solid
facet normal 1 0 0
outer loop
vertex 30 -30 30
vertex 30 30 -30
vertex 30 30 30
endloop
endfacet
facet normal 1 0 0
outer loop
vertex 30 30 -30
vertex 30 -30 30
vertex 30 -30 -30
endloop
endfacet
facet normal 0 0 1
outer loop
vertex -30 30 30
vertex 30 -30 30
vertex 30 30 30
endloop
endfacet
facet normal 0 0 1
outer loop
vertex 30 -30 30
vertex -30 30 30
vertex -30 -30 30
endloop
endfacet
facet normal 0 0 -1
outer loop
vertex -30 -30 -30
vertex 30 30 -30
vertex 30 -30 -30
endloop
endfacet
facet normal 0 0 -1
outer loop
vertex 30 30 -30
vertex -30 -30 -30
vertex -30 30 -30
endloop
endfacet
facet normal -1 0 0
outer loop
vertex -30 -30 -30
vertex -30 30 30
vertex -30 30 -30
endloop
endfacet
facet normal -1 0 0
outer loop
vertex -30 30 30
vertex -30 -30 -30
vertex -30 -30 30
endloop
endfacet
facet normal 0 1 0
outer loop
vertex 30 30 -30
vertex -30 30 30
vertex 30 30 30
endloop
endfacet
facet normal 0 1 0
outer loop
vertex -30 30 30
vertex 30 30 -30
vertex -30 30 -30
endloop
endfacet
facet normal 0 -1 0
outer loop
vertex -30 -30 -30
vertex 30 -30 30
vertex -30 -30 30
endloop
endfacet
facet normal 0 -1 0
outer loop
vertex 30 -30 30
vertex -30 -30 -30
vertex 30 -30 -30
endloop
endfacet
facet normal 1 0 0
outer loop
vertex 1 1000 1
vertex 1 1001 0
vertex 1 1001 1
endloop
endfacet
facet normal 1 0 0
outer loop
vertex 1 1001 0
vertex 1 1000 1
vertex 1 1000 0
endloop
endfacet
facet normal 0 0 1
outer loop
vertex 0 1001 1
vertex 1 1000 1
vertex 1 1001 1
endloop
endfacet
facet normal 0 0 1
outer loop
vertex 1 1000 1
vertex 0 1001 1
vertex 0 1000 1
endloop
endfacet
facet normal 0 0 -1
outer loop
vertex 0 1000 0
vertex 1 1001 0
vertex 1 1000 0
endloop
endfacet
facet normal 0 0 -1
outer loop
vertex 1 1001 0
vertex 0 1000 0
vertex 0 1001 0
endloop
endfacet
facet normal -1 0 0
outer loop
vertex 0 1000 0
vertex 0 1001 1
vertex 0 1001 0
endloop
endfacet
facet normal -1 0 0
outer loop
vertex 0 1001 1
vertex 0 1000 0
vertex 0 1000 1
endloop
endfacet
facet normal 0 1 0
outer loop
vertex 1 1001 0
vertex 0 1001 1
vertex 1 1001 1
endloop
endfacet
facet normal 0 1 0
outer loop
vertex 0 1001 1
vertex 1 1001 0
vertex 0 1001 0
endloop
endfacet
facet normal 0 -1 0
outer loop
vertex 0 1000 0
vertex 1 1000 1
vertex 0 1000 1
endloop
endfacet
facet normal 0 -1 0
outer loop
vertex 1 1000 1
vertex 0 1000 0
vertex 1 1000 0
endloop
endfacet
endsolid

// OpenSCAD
// The depth range must be centred on the viewport's centre of rotation, not on
// the model's bounding box.
//
// A cube on the rotation centre, and one small cube a thousand units away so the
// bounding box is enormous and its centre is nowhere near either object. The
// centred cube sits where the camera orbits, so its distance from the eye never
// changes and neither may its shade - from any angle, in either of the two views
// below. A cube rather than a sphere because its faces are flat: every pixel of a
// face is at an exactly determined depth, so a drift of even one grey level is a
// real change rather than resampling noise on a curved silhouette.
//
// Rendered against separate expected images rather than a shared one, because the
// far cube genuinely moves between these angles.
//
// It cannot be otherwise, and the reason is worth writing down. Whole-image
// identity under a rotation needs the scene to be invariant under it, which pins
// the bounding box centre on the rotation axis - and then the eye-to-box-centre
// distance does not change either, so the very bug this model exists to catch
// becomes invisible. Discrimination and exact identity cannot come from the same
// pair of views. depthmap-orbit-symmetry takes the identity half on a symmetric
// scene; this file takes the discriminating half. When the range was centred on
// the bounding box, the centred object here rendered blown out to pure white
// from one angle and clamped to invisible from another.
cube(60, center = true);
translate([0, 1000, 0]) cube();
